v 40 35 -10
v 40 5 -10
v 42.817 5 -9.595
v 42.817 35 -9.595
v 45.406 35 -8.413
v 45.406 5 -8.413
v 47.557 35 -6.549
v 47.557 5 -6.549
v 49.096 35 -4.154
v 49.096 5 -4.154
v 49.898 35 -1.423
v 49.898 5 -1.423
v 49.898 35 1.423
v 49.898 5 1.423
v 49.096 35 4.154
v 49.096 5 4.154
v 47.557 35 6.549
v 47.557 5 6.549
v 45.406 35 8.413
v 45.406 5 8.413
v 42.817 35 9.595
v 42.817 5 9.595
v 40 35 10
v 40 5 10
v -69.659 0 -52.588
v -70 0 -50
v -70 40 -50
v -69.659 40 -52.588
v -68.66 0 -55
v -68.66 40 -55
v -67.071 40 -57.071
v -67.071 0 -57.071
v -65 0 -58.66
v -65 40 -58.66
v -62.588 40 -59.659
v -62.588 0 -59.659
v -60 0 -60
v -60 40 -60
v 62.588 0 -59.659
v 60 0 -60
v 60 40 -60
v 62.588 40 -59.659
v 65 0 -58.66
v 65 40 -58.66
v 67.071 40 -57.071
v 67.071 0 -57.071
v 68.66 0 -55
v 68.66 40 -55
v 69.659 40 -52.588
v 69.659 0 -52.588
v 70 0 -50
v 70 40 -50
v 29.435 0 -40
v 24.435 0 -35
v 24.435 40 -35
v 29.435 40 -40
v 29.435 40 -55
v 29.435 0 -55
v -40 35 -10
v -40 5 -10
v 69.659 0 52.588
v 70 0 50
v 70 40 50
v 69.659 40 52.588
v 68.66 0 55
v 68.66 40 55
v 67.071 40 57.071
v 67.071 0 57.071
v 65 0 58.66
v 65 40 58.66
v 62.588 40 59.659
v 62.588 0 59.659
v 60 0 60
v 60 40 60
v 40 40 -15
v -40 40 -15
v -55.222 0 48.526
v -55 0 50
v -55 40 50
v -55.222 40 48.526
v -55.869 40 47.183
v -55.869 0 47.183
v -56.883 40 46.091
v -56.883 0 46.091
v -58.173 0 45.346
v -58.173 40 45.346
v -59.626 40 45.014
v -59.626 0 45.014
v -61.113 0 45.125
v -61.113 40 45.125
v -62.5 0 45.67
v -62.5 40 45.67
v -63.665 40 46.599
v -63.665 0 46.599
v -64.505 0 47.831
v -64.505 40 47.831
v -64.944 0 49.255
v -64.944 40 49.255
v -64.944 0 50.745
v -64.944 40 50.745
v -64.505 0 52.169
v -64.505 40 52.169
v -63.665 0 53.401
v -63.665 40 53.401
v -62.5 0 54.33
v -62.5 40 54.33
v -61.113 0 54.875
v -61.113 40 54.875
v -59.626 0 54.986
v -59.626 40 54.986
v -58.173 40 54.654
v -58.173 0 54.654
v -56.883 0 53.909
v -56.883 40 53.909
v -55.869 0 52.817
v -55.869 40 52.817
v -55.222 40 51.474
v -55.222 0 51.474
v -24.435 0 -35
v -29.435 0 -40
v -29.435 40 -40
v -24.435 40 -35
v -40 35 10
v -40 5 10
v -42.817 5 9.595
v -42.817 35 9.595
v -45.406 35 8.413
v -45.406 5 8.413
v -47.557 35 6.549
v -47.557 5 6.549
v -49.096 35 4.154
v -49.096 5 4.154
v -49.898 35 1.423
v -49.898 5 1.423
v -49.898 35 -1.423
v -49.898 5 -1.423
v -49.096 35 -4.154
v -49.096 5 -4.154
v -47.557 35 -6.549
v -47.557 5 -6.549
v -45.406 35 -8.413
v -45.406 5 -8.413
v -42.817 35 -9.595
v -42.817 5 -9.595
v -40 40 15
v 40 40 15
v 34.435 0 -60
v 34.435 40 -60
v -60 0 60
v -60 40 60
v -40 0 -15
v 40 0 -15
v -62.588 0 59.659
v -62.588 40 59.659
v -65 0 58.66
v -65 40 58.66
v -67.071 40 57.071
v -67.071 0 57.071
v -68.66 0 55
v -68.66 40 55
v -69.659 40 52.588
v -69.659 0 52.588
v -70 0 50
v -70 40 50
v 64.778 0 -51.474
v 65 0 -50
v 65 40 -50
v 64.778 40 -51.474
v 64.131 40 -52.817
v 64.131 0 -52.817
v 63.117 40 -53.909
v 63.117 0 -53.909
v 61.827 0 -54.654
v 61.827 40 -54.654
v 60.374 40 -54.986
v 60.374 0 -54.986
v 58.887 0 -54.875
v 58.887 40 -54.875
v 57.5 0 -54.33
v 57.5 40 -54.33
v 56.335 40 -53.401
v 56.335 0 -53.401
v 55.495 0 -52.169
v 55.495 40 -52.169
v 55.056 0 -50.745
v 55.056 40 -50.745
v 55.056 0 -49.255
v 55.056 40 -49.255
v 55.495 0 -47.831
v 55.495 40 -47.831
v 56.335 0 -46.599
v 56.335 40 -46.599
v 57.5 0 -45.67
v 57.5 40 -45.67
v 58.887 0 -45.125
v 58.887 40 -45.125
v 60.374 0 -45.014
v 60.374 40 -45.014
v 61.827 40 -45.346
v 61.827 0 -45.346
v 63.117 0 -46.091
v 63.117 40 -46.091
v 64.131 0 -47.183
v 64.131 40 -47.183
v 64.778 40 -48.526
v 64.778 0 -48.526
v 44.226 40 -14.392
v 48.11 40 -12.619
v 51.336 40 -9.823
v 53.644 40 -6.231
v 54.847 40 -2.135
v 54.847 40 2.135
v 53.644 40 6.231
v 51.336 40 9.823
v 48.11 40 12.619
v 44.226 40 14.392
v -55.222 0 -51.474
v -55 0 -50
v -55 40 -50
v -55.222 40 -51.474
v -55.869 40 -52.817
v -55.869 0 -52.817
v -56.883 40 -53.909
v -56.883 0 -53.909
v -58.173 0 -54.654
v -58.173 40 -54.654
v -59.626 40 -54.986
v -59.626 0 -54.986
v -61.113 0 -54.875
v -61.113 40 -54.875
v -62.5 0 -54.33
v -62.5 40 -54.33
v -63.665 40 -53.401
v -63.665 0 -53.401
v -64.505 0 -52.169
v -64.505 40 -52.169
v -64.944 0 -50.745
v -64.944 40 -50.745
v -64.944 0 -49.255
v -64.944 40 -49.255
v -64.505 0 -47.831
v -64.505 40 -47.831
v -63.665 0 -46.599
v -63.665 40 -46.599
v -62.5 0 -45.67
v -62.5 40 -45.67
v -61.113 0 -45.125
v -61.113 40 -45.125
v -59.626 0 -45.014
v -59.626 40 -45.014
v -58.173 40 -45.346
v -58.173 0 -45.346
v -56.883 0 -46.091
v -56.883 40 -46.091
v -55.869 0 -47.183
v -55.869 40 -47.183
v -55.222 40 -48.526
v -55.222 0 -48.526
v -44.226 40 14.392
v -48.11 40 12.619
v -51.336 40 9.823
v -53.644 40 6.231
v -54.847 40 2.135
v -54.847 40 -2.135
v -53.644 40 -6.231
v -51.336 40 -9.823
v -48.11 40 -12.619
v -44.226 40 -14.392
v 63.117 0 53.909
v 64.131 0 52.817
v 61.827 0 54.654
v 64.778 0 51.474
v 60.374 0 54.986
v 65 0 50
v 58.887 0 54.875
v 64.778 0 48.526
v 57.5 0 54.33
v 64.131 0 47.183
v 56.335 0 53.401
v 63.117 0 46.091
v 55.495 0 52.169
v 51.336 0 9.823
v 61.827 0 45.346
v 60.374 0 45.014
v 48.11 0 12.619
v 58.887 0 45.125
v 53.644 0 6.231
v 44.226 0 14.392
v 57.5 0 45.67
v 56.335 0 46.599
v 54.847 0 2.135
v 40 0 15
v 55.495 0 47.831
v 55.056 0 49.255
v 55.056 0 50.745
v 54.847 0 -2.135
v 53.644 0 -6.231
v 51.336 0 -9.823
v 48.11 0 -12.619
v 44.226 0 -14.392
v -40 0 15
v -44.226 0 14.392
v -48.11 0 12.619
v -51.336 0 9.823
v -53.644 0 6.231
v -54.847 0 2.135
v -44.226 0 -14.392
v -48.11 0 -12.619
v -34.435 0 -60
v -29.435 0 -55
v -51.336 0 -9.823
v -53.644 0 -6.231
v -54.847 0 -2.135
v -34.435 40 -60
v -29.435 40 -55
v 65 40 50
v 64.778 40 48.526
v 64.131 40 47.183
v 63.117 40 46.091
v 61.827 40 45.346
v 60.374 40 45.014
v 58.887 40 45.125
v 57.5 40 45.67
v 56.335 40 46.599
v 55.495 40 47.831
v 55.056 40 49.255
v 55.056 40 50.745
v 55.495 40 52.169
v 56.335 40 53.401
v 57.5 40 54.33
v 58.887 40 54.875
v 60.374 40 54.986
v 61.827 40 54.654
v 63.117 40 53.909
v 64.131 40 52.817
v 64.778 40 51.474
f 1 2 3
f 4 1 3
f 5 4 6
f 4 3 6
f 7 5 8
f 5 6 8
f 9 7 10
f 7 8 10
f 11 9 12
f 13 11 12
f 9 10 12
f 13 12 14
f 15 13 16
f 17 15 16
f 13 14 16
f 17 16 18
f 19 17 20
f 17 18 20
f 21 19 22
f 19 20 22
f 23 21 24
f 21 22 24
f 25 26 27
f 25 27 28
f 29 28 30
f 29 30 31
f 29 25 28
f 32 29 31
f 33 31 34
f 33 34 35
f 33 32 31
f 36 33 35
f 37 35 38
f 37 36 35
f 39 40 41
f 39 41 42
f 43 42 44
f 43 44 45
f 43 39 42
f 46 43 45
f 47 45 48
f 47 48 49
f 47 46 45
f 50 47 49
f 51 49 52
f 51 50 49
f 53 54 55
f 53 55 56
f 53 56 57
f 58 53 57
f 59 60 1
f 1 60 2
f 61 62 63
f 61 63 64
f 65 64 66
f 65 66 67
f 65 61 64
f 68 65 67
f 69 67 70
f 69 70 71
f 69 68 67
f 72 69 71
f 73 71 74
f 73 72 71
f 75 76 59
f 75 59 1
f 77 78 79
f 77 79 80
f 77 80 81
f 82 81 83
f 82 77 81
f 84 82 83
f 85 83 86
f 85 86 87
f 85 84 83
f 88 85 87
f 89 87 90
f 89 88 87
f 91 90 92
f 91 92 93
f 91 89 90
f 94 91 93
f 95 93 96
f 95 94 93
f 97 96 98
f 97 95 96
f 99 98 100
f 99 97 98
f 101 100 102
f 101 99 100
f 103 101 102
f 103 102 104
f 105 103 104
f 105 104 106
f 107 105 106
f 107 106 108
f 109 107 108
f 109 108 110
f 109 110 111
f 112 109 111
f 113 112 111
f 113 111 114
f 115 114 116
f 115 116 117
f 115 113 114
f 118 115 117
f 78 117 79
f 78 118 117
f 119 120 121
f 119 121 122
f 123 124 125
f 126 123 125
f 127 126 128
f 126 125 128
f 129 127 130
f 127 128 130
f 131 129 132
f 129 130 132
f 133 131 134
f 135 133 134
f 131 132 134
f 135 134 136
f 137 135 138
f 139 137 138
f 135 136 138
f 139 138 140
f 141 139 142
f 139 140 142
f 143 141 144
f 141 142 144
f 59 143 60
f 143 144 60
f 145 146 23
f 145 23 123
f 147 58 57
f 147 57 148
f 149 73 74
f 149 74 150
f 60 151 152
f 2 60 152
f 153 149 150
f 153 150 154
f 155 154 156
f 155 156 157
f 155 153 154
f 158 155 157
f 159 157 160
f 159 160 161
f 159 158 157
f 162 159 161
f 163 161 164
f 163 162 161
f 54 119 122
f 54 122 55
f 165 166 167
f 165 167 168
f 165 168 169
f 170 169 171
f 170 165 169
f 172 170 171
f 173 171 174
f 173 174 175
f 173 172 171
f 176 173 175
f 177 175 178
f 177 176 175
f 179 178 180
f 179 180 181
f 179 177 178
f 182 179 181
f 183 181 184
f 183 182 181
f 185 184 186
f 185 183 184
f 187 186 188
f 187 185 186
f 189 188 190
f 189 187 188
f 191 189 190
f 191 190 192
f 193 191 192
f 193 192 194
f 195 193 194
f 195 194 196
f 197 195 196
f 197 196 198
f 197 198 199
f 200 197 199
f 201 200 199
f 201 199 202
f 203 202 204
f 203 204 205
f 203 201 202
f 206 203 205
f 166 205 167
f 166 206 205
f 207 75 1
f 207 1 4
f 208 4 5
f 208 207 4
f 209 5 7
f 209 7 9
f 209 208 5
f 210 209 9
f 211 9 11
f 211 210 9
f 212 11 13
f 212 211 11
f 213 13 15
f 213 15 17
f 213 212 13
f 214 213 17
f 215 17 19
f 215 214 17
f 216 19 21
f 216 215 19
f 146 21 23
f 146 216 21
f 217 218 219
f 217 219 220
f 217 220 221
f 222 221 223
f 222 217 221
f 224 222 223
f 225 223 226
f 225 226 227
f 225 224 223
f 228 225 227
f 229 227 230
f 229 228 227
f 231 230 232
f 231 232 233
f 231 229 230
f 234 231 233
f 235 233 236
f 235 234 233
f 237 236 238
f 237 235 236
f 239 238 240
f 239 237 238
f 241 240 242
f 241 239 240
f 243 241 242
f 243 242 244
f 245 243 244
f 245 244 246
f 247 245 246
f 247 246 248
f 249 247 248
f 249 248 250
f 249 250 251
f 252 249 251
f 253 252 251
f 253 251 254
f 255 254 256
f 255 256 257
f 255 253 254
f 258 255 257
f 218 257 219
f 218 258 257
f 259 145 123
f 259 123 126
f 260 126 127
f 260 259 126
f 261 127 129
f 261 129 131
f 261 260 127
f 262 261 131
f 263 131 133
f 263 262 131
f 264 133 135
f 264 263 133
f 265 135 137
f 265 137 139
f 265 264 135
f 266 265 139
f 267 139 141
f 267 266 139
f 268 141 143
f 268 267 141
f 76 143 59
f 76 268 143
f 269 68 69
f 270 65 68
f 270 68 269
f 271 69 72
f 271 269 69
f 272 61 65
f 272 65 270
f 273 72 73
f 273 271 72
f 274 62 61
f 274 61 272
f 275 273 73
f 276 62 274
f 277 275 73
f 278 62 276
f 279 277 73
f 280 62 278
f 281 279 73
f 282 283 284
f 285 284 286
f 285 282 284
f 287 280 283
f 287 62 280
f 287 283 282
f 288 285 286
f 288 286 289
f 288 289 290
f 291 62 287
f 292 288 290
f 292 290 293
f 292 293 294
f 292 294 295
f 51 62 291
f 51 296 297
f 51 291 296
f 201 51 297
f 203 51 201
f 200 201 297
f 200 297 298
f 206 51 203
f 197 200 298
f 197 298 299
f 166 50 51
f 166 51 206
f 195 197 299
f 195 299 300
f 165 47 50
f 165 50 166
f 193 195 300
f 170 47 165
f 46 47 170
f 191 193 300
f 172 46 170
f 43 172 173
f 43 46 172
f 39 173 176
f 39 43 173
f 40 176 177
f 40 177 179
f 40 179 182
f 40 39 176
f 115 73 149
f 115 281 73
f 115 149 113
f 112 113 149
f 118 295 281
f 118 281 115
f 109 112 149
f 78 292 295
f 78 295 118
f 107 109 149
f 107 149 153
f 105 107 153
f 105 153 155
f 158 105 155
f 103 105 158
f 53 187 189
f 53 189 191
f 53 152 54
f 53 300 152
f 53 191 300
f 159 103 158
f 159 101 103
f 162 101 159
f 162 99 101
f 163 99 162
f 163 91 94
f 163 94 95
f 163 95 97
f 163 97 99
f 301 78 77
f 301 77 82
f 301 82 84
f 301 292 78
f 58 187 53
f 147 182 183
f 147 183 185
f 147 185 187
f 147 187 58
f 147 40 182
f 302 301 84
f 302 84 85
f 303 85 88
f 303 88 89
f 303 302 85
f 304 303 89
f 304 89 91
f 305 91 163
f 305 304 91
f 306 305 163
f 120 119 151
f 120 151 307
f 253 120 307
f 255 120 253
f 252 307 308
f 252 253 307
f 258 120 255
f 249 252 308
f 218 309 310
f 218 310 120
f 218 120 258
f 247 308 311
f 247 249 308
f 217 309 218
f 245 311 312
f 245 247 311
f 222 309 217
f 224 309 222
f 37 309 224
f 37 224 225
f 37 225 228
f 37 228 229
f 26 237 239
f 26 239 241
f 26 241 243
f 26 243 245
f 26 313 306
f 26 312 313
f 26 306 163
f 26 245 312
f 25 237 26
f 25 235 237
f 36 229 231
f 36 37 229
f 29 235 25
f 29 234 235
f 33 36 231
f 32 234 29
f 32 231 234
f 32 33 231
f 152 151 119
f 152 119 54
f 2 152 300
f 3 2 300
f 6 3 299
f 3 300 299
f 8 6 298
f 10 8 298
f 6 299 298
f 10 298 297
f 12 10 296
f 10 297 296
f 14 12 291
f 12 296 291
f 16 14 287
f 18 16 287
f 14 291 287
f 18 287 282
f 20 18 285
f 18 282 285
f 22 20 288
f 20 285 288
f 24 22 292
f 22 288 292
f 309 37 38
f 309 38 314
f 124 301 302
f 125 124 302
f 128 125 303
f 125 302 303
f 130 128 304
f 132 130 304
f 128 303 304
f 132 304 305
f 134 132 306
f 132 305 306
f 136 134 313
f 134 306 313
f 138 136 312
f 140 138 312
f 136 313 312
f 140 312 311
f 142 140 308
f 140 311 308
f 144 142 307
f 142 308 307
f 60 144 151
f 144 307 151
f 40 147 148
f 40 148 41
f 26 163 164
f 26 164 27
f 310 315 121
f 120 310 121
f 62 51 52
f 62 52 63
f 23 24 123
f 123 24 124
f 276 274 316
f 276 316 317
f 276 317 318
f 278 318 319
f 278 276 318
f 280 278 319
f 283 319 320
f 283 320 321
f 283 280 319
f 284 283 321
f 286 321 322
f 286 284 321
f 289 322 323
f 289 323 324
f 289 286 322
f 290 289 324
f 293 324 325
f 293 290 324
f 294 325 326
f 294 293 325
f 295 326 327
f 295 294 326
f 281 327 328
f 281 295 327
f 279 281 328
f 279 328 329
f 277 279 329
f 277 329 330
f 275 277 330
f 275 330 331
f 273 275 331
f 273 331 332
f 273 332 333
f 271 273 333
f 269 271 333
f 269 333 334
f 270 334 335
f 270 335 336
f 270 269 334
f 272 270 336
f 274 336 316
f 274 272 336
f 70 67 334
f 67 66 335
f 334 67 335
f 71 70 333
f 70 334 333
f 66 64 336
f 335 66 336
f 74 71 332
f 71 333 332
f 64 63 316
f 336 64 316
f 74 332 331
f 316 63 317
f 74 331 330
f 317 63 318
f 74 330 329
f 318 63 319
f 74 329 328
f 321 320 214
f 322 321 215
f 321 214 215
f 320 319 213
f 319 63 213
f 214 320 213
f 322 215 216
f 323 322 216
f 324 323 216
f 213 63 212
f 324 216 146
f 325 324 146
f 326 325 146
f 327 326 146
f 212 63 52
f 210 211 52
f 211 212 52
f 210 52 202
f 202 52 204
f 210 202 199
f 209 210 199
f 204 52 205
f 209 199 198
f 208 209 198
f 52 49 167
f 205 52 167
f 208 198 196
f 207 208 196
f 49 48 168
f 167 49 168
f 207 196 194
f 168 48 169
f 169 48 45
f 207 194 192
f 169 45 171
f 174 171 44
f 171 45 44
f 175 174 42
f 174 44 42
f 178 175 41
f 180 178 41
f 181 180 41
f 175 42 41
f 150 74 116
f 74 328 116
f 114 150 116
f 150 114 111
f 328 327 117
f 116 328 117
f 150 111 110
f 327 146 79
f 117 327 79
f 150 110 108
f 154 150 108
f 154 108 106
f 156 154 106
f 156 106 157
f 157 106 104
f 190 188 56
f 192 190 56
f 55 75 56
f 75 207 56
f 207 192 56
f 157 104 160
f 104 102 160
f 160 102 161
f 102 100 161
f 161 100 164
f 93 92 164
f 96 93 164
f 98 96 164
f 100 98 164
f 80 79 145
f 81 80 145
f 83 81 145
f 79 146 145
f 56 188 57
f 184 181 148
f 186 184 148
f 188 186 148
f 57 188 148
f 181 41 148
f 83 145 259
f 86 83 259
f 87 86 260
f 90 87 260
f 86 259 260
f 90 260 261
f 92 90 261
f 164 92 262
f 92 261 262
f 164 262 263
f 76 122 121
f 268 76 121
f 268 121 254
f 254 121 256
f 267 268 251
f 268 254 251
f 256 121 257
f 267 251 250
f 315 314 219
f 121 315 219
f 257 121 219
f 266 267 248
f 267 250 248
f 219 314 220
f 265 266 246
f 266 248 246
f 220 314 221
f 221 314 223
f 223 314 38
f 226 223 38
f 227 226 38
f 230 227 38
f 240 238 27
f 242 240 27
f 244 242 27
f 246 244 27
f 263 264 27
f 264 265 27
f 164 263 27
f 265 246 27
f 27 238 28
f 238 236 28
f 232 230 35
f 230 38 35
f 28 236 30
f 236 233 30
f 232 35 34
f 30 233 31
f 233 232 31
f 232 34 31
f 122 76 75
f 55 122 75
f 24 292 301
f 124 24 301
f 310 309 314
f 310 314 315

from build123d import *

# Parameters (mm, degrees)
SKETCH1_R           = 5
BOSS_EXTRUDE2_DEPTH = 40
CHAMFER1_SIZE       = 5


with BuildPart() as part:
    # Sketch1 → Boss-Extrude2 (new body)
    with BuildSketch(Plane(origin=(0, 0, 0), x_dir=(1, 0, 0), z_dir=(0, 1, 0))):
        with BuildLine():
            Line((-60, 60), (-34.43523791, 60))
            Line((-34.43523791, 60), (-29.43523791, 55))
            Line((-29.43523791, 55), (-29.43523791, 40))
            Line((-29.43523791, 40), (-24.43523791, 35))
            Line((-24.43523791, 35), (24.43523791, 35))
            Line((24.43523791, 35), (29.43523791, 40))
            Line((29.43523791, 40), (29.43523791, 55))
            Line((29.43523791, 55), (34.43523791, 60))
            Line((34.43523791, 60), (60, 60))
            ThreePointArc((60, 60), (67.071067812, 57.071067812), (70, 50))
            Line((70, 50), (70, -50))
            ThreePointArc((70, -50), (67.071067812, -57.071067812), (60, -60))
            Line((60, -60), (-60, -60))
            ThreePointArc((-60, -60), (-67.071067812, -57.071067812), (-70, -50))
            Line((-70, -50), (-70, 50))
            ThreePointArc((-70, 50), (-67.071067812, 57.071067812), (-60, 60))
        make_face()
        with Locations((-60, 50)):
            Circle(SKETCH1_R, mode=Mode.SUBTRACT)
        with Locations((60, 50)):
            Circle(SKETCH1_R, mode=Mode.SUBTRACT)
        with Locations((60, -50)):
            Circle(SKETCH1_R, mode=Mode.SUBTRACT)
        with Locations((-60, -50)):
            Circle(SKETCH1_R, mode=Mode.SUBTRACT)
        with BuildLine():
            Line((-40, 10), (40, 10))
            ThreePointArc((40, 10), (50, 0), (40, -10))
            Line((40, -10), (-40, -10))
            ThreePointArc((-40, -10), (-50, 0), (-40, 10))
        make_face(mode=Mode.SUBTRACT)
    extrude(amount=BOSS_EXTRUDE2_DEPTH)

    # Chamfer1
    chamfer1_edges = [part.edges().sort_by_distance(p)[0] for p in [
        (-50, 0, 0),
        (0, 0, 10),
        (50, 0, 0),
        (0, 0, -10),
        (-50, 40, 0),
        (0, 40, 10),
        (50, 40, 0),
        (0, 40, -10),
    ]]
    chamfer(chamfer1_edges, length=CHAMFER1_SIZE)


solid = part.part
